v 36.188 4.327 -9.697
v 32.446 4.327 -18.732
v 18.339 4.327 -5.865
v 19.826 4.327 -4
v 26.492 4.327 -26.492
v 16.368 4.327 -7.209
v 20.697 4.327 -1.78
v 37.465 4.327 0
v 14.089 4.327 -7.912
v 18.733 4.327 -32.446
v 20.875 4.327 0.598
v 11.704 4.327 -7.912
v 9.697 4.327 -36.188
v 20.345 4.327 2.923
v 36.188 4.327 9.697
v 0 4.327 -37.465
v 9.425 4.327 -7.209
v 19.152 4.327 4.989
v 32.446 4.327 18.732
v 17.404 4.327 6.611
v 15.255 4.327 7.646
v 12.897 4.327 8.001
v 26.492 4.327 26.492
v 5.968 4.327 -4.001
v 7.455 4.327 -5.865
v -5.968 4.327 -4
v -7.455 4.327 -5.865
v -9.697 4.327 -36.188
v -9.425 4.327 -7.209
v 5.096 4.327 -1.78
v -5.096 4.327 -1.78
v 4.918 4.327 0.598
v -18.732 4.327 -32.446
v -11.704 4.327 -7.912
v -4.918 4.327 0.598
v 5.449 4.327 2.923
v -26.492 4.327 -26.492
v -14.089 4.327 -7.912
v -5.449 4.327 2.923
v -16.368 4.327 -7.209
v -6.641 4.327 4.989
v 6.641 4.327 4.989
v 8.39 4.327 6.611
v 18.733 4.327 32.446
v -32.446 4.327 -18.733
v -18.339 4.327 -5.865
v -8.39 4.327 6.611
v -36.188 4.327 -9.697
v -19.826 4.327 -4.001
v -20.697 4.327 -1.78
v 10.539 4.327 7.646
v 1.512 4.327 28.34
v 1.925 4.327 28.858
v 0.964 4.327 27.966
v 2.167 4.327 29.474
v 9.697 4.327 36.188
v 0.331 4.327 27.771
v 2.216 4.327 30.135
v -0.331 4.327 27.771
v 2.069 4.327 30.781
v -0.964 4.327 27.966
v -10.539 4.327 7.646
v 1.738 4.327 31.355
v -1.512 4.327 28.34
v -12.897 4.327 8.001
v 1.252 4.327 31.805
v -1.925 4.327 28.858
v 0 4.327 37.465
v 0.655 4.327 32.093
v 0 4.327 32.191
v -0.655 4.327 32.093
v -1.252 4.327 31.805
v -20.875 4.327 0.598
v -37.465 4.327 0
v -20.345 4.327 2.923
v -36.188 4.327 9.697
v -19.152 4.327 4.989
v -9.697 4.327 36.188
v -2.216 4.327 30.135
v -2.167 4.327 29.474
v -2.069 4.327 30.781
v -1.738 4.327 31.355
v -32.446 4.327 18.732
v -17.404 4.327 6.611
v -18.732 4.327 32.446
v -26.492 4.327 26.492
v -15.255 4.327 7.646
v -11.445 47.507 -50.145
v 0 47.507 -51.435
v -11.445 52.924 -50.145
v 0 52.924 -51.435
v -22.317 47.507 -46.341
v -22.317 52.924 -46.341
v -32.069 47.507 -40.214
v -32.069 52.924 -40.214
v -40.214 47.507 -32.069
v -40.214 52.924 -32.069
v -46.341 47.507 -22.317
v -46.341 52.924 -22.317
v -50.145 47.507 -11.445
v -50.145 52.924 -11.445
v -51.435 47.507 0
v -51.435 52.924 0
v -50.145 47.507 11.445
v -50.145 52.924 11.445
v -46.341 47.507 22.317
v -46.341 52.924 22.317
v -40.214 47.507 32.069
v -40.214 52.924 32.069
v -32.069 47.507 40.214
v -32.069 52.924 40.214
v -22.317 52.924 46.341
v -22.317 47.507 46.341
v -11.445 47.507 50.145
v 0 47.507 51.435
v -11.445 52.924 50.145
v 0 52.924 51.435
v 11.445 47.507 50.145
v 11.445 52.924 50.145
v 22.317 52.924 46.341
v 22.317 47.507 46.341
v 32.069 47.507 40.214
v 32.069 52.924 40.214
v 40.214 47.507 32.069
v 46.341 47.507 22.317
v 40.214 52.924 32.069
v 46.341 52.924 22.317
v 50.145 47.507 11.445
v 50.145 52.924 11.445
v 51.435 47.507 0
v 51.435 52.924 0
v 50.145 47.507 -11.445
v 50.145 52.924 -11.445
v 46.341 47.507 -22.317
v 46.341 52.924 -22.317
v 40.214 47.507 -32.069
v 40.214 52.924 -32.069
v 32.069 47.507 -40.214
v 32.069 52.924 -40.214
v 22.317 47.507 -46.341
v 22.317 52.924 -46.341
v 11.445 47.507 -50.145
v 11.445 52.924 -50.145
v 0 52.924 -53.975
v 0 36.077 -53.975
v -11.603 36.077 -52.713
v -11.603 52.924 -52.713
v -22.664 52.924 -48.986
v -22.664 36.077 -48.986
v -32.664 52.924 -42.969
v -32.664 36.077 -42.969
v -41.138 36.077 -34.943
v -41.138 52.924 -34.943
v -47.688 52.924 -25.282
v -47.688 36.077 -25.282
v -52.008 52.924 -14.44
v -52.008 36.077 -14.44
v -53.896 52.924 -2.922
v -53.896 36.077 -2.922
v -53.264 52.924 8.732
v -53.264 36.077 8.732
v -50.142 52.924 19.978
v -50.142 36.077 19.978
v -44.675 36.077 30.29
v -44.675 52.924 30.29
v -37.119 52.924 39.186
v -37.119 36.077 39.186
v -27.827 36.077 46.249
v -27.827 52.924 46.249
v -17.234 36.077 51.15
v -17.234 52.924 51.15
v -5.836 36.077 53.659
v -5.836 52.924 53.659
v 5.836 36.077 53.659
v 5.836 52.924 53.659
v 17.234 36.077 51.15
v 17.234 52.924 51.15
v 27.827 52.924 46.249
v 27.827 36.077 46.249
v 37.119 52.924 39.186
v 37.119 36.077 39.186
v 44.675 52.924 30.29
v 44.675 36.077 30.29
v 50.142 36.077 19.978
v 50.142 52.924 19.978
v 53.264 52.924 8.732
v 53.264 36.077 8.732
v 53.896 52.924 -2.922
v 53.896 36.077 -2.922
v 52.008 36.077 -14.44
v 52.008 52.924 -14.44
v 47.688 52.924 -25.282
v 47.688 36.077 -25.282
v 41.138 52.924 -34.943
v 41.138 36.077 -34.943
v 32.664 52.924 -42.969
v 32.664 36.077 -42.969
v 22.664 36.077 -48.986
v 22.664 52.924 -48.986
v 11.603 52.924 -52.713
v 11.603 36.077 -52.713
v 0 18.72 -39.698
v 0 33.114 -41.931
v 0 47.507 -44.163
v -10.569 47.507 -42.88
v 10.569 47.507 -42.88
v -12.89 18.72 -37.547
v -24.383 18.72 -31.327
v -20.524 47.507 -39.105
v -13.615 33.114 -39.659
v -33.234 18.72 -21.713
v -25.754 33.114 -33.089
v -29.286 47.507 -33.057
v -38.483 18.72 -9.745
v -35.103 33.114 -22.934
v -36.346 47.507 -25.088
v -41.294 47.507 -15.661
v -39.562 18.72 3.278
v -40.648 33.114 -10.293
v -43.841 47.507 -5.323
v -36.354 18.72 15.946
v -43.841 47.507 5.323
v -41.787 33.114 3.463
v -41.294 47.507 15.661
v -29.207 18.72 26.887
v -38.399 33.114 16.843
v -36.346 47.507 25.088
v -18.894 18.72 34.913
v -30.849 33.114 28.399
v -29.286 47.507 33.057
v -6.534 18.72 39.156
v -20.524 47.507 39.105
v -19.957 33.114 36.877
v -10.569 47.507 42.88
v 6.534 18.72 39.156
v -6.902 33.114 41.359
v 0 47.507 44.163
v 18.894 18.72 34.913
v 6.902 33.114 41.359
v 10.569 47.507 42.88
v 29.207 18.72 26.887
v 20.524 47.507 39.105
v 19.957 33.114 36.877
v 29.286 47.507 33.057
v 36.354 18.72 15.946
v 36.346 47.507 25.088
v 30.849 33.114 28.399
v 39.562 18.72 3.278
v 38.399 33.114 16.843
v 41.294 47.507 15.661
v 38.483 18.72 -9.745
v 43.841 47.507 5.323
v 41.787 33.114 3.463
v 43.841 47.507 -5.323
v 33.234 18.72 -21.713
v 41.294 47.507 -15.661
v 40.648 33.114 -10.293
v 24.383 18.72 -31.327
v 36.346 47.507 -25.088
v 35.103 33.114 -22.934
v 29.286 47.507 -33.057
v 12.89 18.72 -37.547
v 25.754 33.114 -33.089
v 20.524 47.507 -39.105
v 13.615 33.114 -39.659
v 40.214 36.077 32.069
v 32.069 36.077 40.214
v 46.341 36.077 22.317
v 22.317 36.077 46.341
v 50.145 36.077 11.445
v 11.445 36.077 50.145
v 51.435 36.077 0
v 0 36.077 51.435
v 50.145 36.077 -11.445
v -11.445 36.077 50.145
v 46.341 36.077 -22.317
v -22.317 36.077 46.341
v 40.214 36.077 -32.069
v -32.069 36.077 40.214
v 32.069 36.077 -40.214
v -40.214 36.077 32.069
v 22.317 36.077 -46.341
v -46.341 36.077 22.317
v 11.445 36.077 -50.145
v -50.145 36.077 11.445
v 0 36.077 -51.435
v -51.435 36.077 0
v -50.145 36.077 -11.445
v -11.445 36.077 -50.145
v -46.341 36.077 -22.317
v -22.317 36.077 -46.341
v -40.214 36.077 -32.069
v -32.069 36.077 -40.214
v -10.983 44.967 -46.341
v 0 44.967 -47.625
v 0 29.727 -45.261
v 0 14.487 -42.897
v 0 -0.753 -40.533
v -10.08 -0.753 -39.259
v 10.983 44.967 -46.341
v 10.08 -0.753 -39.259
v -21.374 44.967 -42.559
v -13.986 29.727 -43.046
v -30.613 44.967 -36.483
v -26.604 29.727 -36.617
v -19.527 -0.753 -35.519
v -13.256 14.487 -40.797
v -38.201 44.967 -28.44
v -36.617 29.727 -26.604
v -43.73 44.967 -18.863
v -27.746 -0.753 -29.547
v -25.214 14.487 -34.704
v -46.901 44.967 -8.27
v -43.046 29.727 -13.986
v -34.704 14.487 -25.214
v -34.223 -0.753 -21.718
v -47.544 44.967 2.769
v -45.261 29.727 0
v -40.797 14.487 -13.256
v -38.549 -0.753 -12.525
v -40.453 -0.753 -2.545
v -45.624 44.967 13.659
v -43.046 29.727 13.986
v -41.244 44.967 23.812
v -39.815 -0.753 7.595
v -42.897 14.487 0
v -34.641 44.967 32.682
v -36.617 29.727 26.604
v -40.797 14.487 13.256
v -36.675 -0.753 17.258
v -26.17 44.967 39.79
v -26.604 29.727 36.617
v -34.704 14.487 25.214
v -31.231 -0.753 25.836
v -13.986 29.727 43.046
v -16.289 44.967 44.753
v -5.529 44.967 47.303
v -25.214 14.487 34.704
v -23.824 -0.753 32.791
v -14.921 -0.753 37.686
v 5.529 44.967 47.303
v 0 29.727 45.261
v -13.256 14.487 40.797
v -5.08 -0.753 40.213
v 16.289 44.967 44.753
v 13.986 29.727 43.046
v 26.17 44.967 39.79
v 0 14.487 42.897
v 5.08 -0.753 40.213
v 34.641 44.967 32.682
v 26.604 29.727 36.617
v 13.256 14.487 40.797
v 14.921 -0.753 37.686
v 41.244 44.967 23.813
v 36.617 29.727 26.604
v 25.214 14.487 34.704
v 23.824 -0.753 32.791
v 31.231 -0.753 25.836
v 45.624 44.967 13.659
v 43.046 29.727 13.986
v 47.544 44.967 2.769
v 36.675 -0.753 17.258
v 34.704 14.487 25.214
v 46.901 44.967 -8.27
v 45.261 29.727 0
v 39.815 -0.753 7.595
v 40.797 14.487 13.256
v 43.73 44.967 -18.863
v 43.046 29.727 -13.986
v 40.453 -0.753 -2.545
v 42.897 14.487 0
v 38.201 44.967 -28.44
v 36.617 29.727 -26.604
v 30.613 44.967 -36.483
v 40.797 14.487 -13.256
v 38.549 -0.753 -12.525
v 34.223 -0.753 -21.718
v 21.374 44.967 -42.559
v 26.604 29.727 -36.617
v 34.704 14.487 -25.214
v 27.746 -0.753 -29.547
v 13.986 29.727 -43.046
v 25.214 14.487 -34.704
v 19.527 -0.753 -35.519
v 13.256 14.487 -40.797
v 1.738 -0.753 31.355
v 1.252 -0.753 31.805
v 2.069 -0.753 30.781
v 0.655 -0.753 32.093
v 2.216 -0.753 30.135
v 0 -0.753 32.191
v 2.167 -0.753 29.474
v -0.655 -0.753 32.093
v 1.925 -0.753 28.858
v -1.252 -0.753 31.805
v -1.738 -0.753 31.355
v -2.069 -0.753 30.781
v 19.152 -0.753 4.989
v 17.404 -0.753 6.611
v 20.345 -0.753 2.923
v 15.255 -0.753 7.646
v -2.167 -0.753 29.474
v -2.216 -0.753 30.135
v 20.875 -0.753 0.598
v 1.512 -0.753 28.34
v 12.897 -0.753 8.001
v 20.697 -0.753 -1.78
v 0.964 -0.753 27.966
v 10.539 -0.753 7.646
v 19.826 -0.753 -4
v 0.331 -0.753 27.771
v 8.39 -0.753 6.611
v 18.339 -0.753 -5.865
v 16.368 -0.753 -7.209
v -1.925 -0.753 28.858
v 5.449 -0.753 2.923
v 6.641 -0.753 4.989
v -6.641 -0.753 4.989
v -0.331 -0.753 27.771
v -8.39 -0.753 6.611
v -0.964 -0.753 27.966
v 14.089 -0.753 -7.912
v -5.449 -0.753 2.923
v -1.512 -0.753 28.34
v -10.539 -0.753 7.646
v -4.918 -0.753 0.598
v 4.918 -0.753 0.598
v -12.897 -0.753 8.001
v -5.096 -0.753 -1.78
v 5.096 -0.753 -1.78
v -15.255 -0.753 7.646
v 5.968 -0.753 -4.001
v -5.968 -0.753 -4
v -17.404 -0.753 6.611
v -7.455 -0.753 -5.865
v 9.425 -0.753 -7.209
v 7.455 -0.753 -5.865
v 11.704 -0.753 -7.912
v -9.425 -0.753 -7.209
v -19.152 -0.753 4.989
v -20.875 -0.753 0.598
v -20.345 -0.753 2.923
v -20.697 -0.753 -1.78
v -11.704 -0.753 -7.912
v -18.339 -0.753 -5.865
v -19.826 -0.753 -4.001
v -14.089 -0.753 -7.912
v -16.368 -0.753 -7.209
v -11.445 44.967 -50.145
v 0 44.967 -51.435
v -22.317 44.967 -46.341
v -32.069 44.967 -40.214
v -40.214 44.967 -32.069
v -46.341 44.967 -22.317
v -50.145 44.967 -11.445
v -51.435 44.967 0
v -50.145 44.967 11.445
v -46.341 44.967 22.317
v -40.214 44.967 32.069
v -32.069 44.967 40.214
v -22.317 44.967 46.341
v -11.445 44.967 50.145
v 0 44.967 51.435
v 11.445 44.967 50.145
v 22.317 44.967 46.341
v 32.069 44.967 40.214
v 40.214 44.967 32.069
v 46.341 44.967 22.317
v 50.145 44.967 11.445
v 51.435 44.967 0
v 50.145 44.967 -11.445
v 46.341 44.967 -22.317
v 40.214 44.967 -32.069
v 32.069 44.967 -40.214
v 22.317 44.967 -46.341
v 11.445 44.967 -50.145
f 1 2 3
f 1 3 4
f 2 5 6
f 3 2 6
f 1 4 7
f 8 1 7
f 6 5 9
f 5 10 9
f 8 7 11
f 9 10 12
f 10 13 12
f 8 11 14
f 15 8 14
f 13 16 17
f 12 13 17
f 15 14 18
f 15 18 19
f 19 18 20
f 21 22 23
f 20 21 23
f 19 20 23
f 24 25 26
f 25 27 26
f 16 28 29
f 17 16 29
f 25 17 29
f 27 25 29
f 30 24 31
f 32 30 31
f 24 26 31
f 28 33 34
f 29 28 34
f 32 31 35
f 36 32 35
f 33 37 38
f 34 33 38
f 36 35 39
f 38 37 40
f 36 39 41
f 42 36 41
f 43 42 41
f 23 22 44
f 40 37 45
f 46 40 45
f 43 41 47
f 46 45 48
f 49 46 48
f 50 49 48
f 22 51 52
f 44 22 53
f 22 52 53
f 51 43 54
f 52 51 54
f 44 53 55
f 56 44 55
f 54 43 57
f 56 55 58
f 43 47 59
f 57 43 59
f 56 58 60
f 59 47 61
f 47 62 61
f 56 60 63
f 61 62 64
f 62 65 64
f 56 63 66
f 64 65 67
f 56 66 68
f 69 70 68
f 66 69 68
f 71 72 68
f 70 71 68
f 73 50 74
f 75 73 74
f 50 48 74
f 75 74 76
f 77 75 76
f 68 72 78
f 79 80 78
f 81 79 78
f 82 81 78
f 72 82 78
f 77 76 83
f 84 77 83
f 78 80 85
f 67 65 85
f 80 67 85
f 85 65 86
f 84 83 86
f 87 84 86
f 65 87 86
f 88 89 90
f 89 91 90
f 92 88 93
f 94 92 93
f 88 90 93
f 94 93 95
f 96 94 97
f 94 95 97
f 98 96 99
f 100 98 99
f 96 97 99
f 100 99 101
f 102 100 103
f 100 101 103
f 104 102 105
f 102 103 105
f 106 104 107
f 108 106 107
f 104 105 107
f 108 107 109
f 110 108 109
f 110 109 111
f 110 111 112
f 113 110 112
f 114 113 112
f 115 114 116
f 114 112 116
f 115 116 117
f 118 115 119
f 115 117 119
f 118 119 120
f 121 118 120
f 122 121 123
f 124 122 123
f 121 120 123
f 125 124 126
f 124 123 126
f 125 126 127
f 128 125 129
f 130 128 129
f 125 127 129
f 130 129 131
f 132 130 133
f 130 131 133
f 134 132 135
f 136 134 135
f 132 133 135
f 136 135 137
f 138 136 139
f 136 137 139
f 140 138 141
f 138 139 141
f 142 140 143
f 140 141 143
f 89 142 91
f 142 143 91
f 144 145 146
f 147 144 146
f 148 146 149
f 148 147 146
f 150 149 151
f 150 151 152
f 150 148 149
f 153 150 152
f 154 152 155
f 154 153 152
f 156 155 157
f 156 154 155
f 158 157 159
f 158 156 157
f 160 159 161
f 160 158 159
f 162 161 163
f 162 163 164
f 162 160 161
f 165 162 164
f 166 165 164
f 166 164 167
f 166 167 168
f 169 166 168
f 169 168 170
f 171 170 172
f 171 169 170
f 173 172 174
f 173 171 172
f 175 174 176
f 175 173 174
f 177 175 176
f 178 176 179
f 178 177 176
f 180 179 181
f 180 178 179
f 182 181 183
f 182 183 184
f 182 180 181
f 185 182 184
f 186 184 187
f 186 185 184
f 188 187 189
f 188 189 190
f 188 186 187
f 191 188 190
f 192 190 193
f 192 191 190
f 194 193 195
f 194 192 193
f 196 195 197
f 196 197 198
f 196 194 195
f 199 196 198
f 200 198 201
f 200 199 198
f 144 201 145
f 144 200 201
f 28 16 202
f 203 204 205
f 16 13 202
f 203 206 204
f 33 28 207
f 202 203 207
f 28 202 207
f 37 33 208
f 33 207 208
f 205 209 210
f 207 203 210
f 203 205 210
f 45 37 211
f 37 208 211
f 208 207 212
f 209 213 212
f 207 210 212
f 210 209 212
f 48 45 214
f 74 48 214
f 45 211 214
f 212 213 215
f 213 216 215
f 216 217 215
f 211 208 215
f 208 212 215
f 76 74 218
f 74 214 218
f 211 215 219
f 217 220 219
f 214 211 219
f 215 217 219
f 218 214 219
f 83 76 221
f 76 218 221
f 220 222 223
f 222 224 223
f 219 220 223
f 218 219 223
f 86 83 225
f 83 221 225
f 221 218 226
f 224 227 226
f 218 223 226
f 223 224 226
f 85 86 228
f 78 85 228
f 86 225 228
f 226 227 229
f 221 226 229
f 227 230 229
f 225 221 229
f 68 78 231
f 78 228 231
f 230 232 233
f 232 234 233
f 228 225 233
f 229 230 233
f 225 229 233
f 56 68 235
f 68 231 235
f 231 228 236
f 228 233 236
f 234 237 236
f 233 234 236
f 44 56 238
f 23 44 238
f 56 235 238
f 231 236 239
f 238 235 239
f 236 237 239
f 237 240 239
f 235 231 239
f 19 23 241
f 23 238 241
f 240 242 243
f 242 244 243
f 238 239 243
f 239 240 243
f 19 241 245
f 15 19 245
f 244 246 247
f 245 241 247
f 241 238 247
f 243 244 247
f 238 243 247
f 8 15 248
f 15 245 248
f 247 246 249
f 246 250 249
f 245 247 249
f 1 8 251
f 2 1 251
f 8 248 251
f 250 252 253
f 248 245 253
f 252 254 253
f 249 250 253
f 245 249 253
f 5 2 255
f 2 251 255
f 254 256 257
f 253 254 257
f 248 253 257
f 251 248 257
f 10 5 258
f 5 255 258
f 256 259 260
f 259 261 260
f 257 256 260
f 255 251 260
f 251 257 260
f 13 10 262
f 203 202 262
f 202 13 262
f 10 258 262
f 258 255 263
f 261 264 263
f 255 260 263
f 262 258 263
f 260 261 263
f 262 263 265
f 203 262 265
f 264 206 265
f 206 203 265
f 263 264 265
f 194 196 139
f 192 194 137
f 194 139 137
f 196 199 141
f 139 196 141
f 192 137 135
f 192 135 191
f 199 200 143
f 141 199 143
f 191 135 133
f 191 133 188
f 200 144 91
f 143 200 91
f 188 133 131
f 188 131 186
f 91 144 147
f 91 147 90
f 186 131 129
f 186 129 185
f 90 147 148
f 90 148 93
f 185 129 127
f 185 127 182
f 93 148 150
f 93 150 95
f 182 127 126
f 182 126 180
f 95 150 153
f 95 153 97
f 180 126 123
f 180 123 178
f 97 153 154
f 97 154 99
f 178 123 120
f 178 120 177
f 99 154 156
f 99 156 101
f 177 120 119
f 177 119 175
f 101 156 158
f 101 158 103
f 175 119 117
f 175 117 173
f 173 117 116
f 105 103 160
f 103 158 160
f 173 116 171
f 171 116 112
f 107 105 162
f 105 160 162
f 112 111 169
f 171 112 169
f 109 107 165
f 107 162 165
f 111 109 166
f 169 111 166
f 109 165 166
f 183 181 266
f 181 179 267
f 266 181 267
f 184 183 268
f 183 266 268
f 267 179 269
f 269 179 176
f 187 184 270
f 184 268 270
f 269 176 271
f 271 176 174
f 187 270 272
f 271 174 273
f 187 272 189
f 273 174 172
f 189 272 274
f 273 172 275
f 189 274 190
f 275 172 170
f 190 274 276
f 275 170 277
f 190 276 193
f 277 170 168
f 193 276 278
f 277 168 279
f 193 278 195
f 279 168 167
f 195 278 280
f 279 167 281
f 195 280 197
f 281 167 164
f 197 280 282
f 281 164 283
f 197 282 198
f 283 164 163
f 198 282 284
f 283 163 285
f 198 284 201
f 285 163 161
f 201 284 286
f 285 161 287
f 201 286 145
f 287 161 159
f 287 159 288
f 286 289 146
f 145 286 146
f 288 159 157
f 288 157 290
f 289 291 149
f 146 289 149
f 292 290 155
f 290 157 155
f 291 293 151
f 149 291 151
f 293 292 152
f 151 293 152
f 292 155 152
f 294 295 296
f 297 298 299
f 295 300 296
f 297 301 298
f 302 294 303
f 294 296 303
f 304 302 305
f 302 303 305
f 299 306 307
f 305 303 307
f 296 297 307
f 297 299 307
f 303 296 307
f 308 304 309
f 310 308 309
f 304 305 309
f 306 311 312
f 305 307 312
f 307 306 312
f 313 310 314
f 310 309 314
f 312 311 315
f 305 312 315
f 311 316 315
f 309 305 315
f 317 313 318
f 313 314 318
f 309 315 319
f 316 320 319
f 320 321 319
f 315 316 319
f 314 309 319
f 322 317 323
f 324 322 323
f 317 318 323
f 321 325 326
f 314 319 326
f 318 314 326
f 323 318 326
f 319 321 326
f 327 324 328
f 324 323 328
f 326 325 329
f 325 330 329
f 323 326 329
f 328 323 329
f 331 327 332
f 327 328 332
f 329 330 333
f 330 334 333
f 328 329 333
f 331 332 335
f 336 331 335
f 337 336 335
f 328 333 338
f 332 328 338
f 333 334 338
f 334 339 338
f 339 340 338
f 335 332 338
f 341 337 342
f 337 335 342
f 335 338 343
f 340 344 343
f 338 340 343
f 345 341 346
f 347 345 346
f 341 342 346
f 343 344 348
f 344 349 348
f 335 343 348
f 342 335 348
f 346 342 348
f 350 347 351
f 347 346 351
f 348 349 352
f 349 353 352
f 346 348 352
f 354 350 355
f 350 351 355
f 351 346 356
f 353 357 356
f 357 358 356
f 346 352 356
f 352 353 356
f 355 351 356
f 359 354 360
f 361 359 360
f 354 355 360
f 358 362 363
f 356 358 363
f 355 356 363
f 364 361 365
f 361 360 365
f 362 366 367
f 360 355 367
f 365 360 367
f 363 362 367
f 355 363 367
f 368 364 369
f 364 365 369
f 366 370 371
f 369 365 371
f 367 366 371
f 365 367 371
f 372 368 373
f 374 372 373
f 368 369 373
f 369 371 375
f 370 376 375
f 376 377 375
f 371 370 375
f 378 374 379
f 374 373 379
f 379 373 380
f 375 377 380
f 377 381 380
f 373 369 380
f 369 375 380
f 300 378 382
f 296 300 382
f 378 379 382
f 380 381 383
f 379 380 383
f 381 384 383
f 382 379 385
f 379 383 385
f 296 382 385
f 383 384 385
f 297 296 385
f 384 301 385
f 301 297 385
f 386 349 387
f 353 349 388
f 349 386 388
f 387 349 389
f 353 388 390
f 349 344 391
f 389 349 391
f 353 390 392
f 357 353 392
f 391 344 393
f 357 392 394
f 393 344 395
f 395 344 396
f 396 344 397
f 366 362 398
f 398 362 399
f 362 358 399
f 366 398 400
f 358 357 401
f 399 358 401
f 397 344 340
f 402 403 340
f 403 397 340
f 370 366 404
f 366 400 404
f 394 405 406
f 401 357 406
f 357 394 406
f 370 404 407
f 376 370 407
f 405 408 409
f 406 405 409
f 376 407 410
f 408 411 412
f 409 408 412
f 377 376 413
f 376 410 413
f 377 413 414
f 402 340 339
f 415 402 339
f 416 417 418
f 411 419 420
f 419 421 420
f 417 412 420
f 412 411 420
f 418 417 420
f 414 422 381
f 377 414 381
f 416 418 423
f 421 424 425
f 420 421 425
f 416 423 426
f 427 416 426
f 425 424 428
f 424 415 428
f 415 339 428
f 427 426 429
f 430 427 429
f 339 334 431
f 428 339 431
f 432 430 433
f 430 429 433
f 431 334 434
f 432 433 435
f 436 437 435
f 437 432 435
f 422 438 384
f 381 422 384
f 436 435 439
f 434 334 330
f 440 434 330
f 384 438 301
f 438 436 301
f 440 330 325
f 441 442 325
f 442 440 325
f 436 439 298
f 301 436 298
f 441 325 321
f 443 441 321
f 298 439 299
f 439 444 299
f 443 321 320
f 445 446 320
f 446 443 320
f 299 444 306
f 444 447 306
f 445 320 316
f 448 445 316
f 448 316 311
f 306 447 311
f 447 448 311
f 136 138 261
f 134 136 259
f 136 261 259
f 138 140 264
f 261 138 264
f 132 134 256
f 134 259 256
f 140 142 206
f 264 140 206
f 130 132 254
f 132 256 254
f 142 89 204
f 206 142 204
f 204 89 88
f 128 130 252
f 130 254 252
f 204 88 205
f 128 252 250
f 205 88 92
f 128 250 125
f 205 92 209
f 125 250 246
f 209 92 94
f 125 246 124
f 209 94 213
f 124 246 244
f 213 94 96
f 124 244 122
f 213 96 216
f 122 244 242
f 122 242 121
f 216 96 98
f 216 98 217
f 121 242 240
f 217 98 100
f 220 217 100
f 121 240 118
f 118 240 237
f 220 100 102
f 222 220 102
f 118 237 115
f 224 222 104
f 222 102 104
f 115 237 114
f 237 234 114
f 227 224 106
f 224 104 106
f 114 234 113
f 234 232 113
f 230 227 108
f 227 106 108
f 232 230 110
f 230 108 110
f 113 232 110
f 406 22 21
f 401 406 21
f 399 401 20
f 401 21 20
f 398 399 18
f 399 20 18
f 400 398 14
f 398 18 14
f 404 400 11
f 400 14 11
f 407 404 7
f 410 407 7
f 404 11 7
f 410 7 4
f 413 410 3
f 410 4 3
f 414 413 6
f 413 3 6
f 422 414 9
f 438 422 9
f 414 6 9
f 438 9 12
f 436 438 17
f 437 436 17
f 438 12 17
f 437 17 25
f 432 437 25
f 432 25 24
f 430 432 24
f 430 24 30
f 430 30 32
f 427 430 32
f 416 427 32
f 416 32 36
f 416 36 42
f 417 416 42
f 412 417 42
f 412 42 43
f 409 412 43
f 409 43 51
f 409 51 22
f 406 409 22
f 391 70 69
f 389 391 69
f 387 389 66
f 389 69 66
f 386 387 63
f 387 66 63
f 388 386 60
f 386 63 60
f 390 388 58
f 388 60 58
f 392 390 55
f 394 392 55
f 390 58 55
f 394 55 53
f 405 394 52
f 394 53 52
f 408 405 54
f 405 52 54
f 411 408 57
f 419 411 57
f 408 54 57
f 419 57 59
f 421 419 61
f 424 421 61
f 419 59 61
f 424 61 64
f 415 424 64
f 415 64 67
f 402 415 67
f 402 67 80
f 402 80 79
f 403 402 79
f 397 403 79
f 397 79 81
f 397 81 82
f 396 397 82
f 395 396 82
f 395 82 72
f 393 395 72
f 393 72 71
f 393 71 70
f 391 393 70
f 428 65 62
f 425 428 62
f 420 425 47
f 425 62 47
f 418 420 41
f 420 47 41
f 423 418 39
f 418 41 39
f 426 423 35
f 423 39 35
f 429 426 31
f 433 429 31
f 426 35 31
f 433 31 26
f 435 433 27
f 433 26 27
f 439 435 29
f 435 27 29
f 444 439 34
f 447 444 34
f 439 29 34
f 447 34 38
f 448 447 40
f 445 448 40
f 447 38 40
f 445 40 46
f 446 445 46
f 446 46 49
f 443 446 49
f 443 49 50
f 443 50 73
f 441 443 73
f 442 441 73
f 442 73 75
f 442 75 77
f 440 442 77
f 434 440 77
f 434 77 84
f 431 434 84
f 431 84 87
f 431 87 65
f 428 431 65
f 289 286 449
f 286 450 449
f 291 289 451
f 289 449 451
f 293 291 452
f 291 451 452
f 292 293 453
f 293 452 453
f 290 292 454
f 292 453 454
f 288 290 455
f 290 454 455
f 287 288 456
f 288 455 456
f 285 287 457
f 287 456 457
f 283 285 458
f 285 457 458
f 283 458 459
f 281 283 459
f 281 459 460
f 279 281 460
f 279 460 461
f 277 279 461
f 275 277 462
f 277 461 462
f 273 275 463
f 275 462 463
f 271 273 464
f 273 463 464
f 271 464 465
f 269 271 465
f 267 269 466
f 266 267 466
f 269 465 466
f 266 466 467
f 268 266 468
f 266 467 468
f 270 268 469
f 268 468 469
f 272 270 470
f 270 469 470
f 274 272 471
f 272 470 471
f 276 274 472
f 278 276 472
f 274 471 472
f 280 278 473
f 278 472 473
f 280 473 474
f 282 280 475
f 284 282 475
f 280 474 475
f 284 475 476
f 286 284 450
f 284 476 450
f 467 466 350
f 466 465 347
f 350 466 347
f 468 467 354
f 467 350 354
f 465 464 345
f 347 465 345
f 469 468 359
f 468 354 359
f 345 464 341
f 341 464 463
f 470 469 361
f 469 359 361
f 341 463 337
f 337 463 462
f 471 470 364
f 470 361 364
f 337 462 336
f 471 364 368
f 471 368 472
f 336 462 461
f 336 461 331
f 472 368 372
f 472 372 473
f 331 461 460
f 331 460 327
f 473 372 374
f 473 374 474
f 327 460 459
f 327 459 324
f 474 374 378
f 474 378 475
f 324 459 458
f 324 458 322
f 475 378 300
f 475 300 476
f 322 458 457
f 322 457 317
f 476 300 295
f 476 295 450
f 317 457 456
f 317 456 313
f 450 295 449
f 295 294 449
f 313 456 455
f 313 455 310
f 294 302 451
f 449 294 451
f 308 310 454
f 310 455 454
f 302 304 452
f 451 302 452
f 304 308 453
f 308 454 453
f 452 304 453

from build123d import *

# Parameters (mm, degrees)
SKETCH2_R          = 8.001
SKETCH2_R_2        = 2.2225
CUT_EXTRUDE1_DEPTH = 91.48908463


with BuildPart() as part:
    # Sketch1 → Revolve1 (revolve)
    with BuildSketch(Plane.XY, mode=Mode.PRIVATE) as revolve1_sk:
        Polygon((37.465, 4.32701069), (44.163455703, 47.50701069), (51.435, 47.50701069), (51.435, 52.924059852), (53.975, 52.924059852), (53.975, 46.574059852), (53.975, 36.07701069), (51.435, 36.07701069), (51.435, 44.96701069), (47.625, 44.96701069), (40.532517491, -0.75298931), (0, -0.75298931), (0, 4.32701069), align=None)
    revolve(revolve1_sk.sketch.rotate(Axis((0, 0, 0), (0, 1, 0)), 90), axis=Axis((0, 0, 0), (0, 1, 0)))

    # Sketch2 → Cut-Extrude1 (cut, through all)
    with BuildSketch(Plane(origin=(0, 4.32701069, 0), x_dir=(1, 0, 0), z_dir=(0, 1, 0))):
        with Locations(Location((-12.89685, 0, 0), (0, 0, 270))):
            Circle(SKETCH2_R)
        with Locations(Location((12.89685, 0, 0), (0, 0, 270))):
            Circle(SKETCH2_R)
        with Locations(Location((0, -29.968876042, 0), (0, 0, 270))):
            Circle(SKETCH2_R_2)
    extrude(amount=-CUT_EXTRUDE1_DEPTH, mode=Mode.SUBTRACT)


solid = part.part
